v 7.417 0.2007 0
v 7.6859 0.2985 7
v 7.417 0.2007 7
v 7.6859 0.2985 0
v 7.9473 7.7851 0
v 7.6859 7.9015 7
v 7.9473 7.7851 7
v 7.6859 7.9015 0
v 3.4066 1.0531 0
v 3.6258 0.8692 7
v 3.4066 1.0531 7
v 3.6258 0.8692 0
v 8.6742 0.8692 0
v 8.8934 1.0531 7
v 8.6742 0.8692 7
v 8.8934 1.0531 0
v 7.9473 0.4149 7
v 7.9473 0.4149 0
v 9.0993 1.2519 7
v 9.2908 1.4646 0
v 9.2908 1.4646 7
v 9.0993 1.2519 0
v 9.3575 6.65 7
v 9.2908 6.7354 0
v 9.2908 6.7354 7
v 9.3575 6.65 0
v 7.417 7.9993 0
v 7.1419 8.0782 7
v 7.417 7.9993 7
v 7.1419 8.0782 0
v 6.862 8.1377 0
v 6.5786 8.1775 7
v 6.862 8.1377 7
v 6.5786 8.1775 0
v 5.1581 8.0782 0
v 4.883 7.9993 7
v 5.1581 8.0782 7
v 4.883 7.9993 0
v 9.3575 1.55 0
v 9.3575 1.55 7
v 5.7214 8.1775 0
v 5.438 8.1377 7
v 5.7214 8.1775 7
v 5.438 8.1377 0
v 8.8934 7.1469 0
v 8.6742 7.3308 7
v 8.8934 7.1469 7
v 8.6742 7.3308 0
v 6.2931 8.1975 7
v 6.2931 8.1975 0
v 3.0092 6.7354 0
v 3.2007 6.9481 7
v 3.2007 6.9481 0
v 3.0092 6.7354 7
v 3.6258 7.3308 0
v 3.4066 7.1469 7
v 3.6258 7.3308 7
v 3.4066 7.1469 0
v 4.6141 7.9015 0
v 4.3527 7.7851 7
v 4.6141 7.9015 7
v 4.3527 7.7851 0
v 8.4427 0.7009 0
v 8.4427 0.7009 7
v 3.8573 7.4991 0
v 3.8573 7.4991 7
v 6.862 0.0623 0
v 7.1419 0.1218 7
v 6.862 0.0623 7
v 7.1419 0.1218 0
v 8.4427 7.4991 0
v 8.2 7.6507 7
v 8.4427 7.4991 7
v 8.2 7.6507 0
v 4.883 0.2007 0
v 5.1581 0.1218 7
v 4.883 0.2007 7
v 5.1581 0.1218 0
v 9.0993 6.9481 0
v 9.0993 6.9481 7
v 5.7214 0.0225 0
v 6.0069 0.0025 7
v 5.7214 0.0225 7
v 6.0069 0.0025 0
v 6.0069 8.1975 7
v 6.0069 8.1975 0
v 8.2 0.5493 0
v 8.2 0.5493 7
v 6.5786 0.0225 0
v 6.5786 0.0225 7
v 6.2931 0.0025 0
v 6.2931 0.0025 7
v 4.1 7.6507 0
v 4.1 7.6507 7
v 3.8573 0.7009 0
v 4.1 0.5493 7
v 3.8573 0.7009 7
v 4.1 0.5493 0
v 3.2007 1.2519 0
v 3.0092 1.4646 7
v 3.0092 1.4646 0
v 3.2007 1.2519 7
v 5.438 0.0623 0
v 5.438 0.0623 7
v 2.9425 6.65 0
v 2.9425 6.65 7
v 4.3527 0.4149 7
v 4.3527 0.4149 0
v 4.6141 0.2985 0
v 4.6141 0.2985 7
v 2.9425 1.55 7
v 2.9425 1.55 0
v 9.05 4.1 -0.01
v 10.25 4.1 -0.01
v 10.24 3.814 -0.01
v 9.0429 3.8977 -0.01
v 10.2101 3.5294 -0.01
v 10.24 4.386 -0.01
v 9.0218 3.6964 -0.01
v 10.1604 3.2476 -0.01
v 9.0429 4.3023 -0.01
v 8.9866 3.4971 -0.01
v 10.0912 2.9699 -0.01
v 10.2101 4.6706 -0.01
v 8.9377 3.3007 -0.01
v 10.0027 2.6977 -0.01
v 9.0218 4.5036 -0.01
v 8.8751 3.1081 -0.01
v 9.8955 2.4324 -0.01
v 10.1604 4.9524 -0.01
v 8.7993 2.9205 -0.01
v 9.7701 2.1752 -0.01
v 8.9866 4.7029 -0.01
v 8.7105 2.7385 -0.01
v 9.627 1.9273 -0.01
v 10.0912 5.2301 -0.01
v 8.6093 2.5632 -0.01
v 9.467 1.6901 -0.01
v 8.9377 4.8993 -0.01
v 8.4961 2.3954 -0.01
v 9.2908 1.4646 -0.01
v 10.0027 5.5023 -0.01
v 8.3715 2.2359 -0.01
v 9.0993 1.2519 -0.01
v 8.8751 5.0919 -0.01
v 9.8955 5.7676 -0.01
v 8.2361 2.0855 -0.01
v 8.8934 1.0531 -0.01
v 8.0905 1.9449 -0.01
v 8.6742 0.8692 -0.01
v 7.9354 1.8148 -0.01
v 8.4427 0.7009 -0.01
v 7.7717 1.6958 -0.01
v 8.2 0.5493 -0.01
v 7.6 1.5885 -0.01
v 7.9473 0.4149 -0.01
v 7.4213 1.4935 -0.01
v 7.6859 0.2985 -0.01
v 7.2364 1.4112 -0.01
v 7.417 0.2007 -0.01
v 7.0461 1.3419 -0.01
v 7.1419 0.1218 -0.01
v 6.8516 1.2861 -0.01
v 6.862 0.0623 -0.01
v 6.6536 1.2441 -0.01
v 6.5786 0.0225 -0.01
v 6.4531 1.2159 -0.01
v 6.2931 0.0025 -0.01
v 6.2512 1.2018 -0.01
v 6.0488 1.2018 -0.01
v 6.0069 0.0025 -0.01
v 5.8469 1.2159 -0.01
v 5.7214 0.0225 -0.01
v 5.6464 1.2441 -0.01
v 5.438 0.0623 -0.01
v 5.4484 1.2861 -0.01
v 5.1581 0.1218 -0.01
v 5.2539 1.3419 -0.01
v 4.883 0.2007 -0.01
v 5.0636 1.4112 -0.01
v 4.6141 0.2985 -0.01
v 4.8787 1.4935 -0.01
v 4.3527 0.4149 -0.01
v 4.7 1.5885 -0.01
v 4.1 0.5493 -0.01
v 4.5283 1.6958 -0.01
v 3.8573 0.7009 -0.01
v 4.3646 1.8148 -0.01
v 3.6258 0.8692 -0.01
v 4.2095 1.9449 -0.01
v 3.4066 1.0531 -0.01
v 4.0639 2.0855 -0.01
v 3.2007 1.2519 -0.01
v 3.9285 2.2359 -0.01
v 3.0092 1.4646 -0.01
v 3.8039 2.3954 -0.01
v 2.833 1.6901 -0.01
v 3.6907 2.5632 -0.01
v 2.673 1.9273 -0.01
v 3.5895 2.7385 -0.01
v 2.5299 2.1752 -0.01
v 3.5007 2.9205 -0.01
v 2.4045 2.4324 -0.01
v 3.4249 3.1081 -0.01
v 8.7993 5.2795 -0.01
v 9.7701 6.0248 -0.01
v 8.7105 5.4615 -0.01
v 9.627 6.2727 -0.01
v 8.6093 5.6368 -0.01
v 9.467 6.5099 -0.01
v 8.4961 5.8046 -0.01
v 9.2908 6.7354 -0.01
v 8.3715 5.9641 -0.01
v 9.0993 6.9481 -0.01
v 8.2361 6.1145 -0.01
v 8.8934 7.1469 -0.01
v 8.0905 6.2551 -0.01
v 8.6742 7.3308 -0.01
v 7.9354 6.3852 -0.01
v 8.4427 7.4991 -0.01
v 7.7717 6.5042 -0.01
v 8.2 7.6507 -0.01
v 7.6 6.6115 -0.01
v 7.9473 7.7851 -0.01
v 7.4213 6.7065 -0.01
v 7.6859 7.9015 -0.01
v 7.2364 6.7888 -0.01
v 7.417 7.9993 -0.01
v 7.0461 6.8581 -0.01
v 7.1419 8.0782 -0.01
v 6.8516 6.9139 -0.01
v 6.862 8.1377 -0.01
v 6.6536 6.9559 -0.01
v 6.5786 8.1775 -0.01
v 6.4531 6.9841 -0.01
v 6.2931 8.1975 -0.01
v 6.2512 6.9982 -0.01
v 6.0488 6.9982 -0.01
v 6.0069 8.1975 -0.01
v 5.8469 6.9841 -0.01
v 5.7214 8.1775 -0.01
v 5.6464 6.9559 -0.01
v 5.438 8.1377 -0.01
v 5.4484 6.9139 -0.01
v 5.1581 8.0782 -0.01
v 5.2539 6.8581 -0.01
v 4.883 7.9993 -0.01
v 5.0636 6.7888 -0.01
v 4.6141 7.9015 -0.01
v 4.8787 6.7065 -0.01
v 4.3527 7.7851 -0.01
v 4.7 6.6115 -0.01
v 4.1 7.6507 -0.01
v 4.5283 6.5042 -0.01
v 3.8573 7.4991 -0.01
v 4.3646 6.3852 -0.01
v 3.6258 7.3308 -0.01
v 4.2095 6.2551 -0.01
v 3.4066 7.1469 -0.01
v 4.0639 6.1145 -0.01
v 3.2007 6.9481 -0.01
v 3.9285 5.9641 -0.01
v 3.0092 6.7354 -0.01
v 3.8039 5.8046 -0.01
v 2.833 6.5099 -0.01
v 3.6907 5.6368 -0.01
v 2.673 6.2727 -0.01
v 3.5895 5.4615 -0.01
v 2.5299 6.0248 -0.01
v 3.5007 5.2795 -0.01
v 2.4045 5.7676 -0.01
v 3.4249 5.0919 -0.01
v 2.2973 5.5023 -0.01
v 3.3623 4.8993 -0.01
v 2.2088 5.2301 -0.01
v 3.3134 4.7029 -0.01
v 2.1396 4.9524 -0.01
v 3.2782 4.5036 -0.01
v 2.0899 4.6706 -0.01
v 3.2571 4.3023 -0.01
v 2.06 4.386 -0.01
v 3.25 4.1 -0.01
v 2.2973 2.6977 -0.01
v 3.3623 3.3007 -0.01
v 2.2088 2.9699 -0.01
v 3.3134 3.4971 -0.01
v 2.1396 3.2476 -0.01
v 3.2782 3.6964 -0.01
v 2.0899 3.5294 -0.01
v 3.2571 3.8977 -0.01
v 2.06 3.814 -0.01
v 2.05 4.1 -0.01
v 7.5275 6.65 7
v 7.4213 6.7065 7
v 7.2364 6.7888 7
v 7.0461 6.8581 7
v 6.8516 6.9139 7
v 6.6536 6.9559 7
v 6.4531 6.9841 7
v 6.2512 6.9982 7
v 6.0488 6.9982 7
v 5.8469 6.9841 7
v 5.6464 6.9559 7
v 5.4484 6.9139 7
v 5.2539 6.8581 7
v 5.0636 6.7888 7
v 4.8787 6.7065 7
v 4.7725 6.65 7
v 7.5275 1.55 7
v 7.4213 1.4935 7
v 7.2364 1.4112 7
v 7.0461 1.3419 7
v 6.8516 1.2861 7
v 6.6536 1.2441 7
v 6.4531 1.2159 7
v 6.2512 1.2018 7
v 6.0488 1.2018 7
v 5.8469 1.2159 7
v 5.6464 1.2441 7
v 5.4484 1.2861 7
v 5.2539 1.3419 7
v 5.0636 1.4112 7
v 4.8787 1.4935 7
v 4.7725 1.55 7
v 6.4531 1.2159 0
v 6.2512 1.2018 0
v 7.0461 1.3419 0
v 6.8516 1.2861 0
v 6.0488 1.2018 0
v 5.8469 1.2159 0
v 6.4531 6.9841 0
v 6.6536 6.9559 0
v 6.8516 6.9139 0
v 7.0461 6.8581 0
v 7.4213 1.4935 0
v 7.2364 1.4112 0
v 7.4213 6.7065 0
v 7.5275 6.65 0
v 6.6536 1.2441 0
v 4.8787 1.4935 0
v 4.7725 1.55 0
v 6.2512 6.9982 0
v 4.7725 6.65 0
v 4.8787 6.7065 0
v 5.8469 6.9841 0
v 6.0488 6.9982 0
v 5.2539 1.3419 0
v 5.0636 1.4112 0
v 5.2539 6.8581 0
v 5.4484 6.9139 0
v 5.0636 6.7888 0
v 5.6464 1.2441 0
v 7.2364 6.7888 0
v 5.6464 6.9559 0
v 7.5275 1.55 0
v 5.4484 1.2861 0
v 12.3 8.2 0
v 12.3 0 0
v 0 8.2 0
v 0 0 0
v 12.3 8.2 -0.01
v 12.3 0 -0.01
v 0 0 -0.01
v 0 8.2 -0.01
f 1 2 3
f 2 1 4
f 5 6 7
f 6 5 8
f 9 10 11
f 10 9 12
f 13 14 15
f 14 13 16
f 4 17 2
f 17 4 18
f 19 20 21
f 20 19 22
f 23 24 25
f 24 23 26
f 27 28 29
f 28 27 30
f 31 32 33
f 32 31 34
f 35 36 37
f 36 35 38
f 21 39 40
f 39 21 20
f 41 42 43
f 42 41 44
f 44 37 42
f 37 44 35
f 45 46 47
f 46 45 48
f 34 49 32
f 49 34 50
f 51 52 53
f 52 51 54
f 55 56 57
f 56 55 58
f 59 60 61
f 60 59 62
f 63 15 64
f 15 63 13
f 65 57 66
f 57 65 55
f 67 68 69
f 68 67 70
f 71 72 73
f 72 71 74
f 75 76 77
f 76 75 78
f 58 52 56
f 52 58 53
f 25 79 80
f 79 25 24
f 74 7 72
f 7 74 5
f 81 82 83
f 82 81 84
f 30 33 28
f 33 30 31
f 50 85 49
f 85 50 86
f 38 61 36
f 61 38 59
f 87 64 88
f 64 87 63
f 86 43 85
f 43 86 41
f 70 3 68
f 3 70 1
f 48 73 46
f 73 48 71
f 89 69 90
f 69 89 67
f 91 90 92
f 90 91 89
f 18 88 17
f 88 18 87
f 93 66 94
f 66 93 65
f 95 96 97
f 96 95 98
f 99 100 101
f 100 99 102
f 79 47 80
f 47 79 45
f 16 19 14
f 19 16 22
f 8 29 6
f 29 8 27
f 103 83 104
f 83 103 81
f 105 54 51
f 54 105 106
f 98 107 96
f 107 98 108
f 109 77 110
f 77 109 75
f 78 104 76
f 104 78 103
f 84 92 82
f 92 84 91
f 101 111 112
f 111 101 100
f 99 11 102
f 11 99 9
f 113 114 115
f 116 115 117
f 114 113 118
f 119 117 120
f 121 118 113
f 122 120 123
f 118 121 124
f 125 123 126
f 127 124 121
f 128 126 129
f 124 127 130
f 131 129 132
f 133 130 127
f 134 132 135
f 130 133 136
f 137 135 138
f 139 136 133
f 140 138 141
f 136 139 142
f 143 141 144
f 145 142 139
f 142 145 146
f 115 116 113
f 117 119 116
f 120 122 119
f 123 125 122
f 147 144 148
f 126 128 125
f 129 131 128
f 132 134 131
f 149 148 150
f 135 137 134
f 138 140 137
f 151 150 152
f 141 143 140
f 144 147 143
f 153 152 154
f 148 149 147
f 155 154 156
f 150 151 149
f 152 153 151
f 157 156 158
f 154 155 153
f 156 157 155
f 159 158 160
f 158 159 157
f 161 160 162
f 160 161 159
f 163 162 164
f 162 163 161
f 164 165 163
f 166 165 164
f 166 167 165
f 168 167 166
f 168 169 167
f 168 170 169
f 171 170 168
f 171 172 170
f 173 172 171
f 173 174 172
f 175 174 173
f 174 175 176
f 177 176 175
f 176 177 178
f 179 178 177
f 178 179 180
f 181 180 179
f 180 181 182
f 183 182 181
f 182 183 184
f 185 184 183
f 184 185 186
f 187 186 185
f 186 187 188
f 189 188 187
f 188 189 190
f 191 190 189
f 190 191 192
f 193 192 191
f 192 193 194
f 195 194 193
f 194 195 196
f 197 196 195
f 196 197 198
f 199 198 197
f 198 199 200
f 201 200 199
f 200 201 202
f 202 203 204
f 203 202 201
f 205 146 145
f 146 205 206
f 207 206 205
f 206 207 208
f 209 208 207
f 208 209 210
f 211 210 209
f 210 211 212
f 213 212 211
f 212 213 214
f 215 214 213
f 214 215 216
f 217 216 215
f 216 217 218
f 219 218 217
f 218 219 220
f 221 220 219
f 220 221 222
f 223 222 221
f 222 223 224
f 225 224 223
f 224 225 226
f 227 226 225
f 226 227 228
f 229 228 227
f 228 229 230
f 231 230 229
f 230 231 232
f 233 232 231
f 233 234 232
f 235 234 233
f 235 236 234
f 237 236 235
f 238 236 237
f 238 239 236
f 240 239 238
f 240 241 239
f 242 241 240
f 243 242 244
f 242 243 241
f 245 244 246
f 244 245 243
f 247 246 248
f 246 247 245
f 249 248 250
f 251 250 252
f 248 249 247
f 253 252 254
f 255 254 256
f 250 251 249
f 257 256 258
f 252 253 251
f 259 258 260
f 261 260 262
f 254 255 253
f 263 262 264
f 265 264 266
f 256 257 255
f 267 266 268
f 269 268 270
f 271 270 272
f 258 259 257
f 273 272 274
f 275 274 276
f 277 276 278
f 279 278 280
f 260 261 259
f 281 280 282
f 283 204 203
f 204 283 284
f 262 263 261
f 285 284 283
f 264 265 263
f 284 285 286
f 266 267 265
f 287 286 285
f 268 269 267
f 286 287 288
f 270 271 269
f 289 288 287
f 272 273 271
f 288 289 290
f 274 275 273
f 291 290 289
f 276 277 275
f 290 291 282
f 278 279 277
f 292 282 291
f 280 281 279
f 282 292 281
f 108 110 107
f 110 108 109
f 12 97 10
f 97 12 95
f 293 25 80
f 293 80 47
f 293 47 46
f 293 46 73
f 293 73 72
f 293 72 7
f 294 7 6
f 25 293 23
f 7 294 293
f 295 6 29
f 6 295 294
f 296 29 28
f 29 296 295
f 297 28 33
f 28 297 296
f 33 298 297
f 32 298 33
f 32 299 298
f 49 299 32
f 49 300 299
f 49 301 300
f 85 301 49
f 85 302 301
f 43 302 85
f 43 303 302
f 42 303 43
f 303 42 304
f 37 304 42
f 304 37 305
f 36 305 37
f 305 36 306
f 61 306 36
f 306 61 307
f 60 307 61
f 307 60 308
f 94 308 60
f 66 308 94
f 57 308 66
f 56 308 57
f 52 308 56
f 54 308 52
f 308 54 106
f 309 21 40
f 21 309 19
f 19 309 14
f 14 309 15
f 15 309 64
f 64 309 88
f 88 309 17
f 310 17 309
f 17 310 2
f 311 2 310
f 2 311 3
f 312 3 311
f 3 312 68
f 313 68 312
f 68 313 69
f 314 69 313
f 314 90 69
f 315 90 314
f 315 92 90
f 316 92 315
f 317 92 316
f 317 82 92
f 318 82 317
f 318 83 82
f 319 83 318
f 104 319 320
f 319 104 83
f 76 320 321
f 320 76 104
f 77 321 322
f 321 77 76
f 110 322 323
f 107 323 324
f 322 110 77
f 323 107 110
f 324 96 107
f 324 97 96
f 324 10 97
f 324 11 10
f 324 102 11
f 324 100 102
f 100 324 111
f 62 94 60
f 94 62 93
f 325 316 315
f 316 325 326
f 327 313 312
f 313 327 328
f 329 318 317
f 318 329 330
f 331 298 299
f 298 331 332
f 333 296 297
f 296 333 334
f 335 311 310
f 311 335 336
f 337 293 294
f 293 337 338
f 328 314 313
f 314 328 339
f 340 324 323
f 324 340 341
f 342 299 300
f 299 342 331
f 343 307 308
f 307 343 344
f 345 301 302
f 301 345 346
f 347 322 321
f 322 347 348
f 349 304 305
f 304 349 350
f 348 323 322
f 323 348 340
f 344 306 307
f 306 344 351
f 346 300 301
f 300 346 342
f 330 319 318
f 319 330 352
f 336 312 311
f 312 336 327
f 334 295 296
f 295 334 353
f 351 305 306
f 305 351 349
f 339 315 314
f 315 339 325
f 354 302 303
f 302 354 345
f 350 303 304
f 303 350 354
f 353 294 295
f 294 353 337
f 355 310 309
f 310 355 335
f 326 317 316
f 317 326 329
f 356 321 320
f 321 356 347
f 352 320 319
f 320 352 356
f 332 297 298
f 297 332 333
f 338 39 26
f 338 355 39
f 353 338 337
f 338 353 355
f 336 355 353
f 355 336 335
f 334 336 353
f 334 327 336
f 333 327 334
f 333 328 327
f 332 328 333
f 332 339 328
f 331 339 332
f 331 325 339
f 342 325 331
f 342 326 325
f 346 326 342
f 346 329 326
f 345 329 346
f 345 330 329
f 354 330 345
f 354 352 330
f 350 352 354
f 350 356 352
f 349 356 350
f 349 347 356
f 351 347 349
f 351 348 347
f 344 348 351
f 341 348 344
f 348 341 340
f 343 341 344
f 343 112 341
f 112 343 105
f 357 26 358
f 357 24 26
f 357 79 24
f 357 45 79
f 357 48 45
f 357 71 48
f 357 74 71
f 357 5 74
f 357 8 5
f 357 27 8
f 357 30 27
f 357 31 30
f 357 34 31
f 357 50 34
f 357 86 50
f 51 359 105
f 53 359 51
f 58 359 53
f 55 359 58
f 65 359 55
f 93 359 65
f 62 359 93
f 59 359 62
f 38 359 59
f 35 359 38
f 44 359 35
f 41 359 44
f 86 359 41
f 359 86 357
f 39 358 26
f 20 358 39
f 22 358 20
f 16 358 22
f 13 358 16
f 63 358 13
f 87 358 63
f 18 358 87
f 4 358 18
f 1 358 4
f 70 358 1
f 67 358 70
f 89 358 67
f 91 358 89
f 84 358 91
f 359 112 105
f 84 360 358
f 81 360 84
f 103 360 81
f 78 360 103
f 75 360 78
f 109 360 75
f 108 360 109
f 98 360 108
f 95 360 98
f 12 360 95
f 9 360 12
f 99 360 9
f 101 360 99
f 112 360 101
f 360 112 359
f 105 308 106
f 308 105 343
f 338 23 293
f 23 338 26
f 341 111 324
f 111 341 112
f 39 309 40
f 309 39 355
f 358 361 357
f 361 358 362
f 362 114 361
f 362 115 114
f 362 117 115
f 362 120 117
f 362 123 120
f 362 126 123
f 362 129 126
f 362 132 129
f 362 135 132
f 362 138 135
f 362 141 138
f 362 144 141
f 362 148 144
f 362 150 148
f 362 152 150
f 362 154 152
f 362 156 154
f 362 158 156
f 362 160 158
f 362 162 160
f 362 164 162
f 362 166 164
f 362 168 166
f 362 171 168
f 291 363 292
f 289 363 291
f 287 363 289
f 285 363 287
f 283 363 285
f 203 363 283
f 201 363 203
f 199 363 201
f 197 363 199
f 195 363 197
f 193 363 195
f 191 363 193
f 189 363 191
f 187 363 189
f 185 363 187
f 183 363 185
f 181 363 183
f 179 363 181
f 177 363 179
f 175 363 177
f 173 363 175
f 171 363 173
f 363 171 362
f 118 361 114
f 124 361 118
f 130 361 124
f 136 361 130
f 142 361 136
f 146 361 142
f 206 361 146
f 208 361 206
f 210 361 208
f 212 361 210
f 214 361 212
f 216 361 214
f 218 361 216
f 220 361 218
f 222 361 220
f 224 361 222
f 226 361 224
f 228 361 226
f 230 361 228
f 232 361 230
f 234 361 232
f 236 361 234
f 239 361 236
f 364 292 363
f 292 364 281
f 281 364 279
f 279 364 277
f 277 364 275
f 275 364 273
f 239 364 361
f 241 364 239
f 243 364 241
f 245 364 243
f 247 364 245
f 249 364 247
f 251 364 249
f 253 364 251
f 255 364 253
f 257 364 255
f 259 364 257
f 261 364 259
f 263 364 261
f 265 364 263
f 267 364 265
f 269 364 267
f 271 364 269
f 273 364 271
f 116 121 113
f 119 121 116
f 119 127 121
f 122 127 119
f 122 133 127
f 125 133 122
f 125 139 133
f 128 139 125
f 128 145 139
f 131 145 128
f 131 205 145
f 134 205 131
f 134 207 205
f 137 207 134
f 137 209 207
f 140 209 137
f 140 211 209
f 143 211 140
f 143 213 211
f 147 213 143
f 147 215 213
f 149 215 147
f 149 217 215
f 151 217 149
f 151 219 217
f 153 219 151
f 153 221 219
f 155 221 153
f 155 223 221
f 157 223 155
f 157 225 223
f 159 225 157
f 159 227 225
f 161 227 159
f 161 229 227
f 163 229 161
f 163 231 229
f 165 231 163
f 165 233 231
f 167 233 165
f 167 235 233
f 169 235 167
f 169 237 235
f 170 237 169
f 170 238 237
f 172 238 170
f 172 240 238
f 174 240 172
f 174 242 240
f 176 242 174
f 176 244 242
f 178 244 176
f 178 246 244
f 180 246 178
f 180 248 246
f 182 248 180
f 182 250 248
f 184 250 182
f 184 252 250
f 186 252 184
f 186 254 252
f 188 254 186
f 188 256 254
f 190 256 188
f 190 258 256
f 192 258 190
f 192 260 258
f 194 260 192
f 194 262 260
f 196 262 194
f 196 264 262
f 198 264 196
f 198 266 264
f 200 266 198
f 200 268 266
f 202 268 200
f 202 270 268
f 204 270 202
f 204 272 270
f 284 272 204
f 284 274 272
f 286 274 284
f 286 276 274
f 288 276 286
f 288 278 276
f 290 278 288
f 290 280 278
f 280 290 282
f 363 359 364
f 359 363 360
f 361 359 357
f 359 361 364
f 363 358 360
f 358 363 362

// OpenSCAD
// file: ../Base/PlacementOptions.scad
// Fischertechnik Box Foundation
// Placement Options

// Alignment
NoAlign = 0;
AlignLeft = 1;
AlignBottom = 2;
AlignCenter = 3;
AlignRight = 4;
AlignTop = 5;

// Element rotation degree steps
rotations = [0, -90, -180, -270];

// Rotation
NoRotation = 0;
Rotate0 = 0;
Rotate90 = 1;
Rotate180 = 2;
Rotate270 = 3;

// Docking (seen from above)
NoDock = -1;
DockLeft = 0;
DockTop = 1;
DockRight = 2;
DockCorner = 2;
DockBottom = 3;

// Web corners
LowerLeft = 0;
UpperLeft = 1;
UpperRight = 2;
LowerRight = 3;

// Web position relative to corner
LeftOfCorner = 0;
RightOfCorner = 1;
// file: ../Base/Boxes.scad
// Fischertechnik Box Foundation
// Pre-designed Boxes

use <Constants.scad>

include <PlacementOptions.scad>

box190Width = 190;
box190Depth = 130;
box130Width = 130;
box130Depth = 95;
boxUsageHeight = 33.9;
boxWallThickness = 2.4;
boxBaseThickness = 1.0;

// getBoxWallThickness()
// Gets the wall thickness of a Fischertechnik Box

function getBoxWallThickness() = boxWallThickness;

// Gets the usable height of a fischertechnik box
function getBoxUsageHeight() = boxUsageHeight;

// Gets the thickness of the Fischertechnik box base.
function getBoxBaseThickness() = boxBaseThickness;

// Gets the usable inner space of a Box 190 as an x/y-list
function getBox190Space() = [
    box190Width - 2*getBoxWallThickness(), 
    box190Depth - 2*getBoxWallThickness() ];

// Imports the Fischertechnik empty box 130x190 mm and places it at position 0,0
// 190x130 are the outer sizes, the inner space is slightly smaller. Use getBox190Space() to get the inner sizes.
// This module needs the STL file "Fischertechnik Box 130x190.stl" in the library path.
// The box is positioned that the usable inner space is at the 0,0,0 position. The

module Box190() {
    translate([-getBoxWallThickness(),-getBoxWallThickness(),-getBoxBaseThickness()])
        import("Fischertechnik Box 130x190.stl", convexity=3);
}

// Gets the usable inner space of a Box 130 as an x/y-list
function getBox130Space() = [
    box130Width - 2*getBoxWallThickness(), 
    box130Depth - 2*getBoxWallThickness() ];

// Imports the Fischertechnik empty box 95x130 mm and places it at position 0,0
// 190x130 are the outer sizes, the inner space is slightly smaller. Use getBox190Space() to get the inner sizes.
// This module needs the STL file "Fischertechnik Box 95x130.stl" in the library path.
// The box is positioned that the usable inner space is at the 0,0,0 position. The

module Box130() {
    translate([-getBoxWallThickness(),-getBoxWallThickness(),-getBoxBaseThickness()])
        import("Fischertechnik Box 95x130.stl", convexity=3);
}

// Creates a web at the specified box walls
// corner 0 = LowerLeft, 1 = UpperLeft, 2 = UpperRight, 3 = LowerRight
// side 0 = LeftOfCorner, 1 = RightOfCorner
// distance = Distance in mm from the corner
// box = inner width and depth of the box (default: Box 190)
// webWidth = length of the web (default is 3 mms)
// webThickness = thickness of the web (default is 1 mm)

module BoxWeb(corner, side, distance, box=getBox190Space(), webWidth=3, webThickness=1.0) {
    sink = getBoxWallThickness()/2;

    width = (corner % 2 == 0) ? 
            (side == LeftOfCorner ? webWidth : webThickness) :
            (side == LeftOfCorner ? webThickness : webWidth);

    depth = (corner % 2 == 0) ? 
            (side == RightOfCorner ? webWidth : webThickness) :
            (side == RightOfCorner ? webThickness : webWidth);
    
    xDiff = corner == LowerLeft ? 
                (side == LeftOfCorner ? -sink : distance) :
            (corner == UpperLeft ?                
                (side == LeftOfCorner ? distance : -sink) :
            (corner == UpperRight ?
                (side == LeftOfCorner ? box.x-webWidth+sink : box.x-distance-webThickness) :
                (side == LeftOfCorner ? box.x-distance-webThickness: box.x-webWidth+sink)));

    yDiff = corner == LowerLeft ? 
                (side == RightOfCorner ? -sink : distance) :
            (corner == UpperLeft ?
                (side == RightOfCorner ? box.y-distance : box.y-webWidth+sink) :
            (corner == UpperRight ?
                (side == RightOfCorner ? box.y-webWidth+sink : box.y-distance) :
                (side == RightOfCorner ? distance : -sink)));
    
    translate([xDiff, yDiff, -getExcess()])
        cube([width, depth, boxUsageHeight + 2*getExcess()]);
}
// file: ../Base/Rotation.scad
// Fischertechnik Box Foundation
// Geometry Helpers Rotation

include <PlacementOptions.scad>

// getRotatedSpace(space, rotation=NoRotation)
// Rotates the space dependent on the specified rotation

function getRotatedSpace(space, rotation=NoRotation) = [
    (rotation == Rotate90 || rotation == Rotate270) ? space.y : space.x,
    (rotation == Rotate90 || rotation == Rotate270) ? space.x : space.y
];

// Rotates the given space around the fixed left lower corner
// space = the space the children needs as width/depth list [width,depth]
// rotation = 0 Rotate0 degrees, 1 Rotate90 degrees, 2 Rotate180 degrees, 3 Rotate270 degrees (equivalent to -90)

module RotateFix(space, rotation=Rotate0) {
    dy = (rotation == Rotate0 || rotation == Rotate270) ? 0 :
        (rotation == Rotate90) ? space.x :
        space.y;
    dx = (rotation < Rotate180) ? 0 :
        (rotation == Rotate180) ? space.x :
        space.y;
    
    translate([dx, dy, 0])
        rotate([0, 0, rotations[rotation]])
            children();
}
// file: ../Base/Alignment.scad
// Fischertechnik Box Foundation
// Geometry Helpers Alignment

include <PlacementOptions.scad>

// getAlignedX(elementWidth, spaceWidth, align=AlignRight, offset=0)
// Gets the aligned X offset of an element with the given
// width in the given space.
// elementWidth = The width of the element to positon
// spaceWidth = The space where the element should be aligned
// align = 0 AlignLeft, 1 AlignCenter, 2 AlignRight
// offset = an optional offset from the aligned position. When
// aligned left or centered, then positive values are in X direction.
// When aligned right then positive values are in negative X direction.

function getAlignedX(elementWidth, spaceWidth, align=AlignRight, offset=0) =
    (align == AlignLeft) ?
        offset :
        ((align == AlignCenter) ?
        (spaceWidth - elementWidth)/2 + offset :
        spaceWidth - offset - elementWidth);

// getAlignedY(elementDepth, spaceDepth, align=AlignTop, offset=0)
// Gets the aligned Y offset of an element with the given
// depth in the given space.
// elementDepth = The depth of the element to positon
// spaceDepth = The space where the element should be aligned
// align = 0 AlignBottom, 1 AlignCenter, 2 AlignTop
// offset = an optional offset from the aligned position. When
// aligned bottom or centered, then positive values are in Y direction.
// When aligned top then positive values are in negative Y direction.

function getAlignedY(elementDepth, spaceDepth, align=AlignTop, offset=0) =
    (align == AlignBottom) ?
        offset :
        ((align == AlignCenter) ?
        (spaceDepth - elementDepth)/2 + offset :
        spaceDepth - offset - elementDepth);
// file: ../Base/Placement.scad
// Fischertechnik Box Foundation
// Geometry Helpers Placement

use <Constants.scad>
use <Alignment.scad>
use <Rotation.scad>
use <Boxes.scad>

include <PlacementOptions.scad>

// Place(x=0, y=0, elementSpace=[0,0], alignX=AlignLeft, alignY=AlignBottom, rotation=Rotate0, boxSpace=getBox190Space())
// Places the child at the specified position
// y = Y-Position. This is a relative position when an X aligment is specified.
// x = X-Position. This is a relative position when an Y aligment is specified.
// elementSpace = space of the element to be placed [x,y]
// alignX = -1=NoAlign, 0 AlignLeft, 1 AlignCenter, 3 AlignRight (elementSpace and boxSpace required!)
// alignY = -1=NoAlign, 2 AlignBottom, 1 AlignCenter, 4 AlignTop (elementSpace and boxSpace required!)
// rotation = 0 Rotate0 0 degrees, 1 Rotate90 90 degrees, 
// 2 Rotate180 180 degrees, 3 Rotate270 270 degrees (equivalent to -90)
// boxSpace = Inner space of the box where the placement occurs [x,y] - default is Box 190x130 inner space

module Place(x=0, y=0, elementSpace=[0,0], 
  alignX=AlignLeft, alignY=AlignBottom, 
  rotation=NoRotation, boxSpace=getBox190Space()) {

    module Position(x, y, space, rotation=Rotate0) {
        translate([x, y, 0])
            RotateFix(space, rotation)
                children(0);
    }

    space = getRotatedSpace(elementSpace, rotation);
    alignedX = getAlignedX(space.x, boxSpace.x, alignX, x);
    alignedY = getAlignedY(space.y, boxSpace.y, alignY, y);
    Position(alignedX, alignedY, elementSpace, rotation)
        children(0);
}

// Center(space=getBox130Space(), elementSpace=[0,0])
// space = Space where the children is centered. For cylinder use centered=true and no elementSpace.
// elementSpace = space of the element to be centered [x,y]

module Center(space=getBox190Space(), elementSpace=[0,0]) {
    translate([(space.x - elementSpace.x) / 2, (space.y - elementSpace.y) / 2])
        children(0);
}

// CenterHorizontal(width=0, y=0, offset=0, space=getBox130Space())
// space = Space where the children is centered. For cylinder use centered=true and no elementSpace.
// elementSpace = space of the element to be centered [x,y]

module CenterHorizontal(width=0, y=0, offset=0, space=getBox190Space()) {
    translate([(space.x - width) / 2 + offset, y])
        children(0);
}

// CenterVertical(depth=0, x=0, offset=0, space=getBox130Space())
// space = Space where the children is centered. For cylinder use centered=true and no elementSpace.
// elementSpace = space of the element to be centered [x,y]

module CenterVerticalal(depth=0, x=0, offset=0, space=getBox190Space()) {
    translate([x, (space.y - depth) / 2 + offset])
        children(0);
}
// file: ../Base/Constants.scad
// Fischertechnik Box Foundation
// Constants

// Constant values necessary for multiple elements

// Base constants
dividerThickness = 1.2;
excess = 0.01;
fragments = 90;
tolerance = 0.8;

// Gets the thickness of a divider 
function getDividerThickness() = dividerThickness;

// Gets the excess that is used to merge walls into each other
function getExcess() = excess;

// Gets amount of fragments of a cylinder
function getFragments() = fragments;

// Gets the inner tolerance of a frame to each side
function getTolerance() = tolerance;


// Fischertechnik specific constants
axisDiameter = 4;
axisBottomDiameter = axisDiameter + 1;
standardEdgeDistance = 2.5;
standardWebDistance = 11.5;
standardCornerLength = 15;
tubeWallFactor = 1.6;

// Gets axis diameter
function getAxisDiameter() = axisDiameter;

// Gets axis bottom diameter for thicker part at the bottom
function getAxisBottomDiameter() = axisBottomDiameter;

// gets the standard distance to the wall of the box for dockable frames with webs
function getStandardEdgeDistance() = standardEdgeDistance;

// gets the standard distance of each web to the corner of the dockable frame
function getStandardWebDistance() = standardWebDistance;

// gets the standard length of the corner walls of a dockable frame
function getStandardCornerLength() = standardCornerLength;

// gets the wall thickness of a tube.
function getTubeWallThickness() = tubeWallFactor * getDividerThickness();
// main file
// Fischertechnik Box Library
// Holder for bulb lamp and lens tip lamp
// 37869, 37875

use <../Base/Constants.scad>
use <../Base/Placement.scad>
use <../ModelBase/Simple.scad>

width = 11.5;
depth = 5.8;

// getHolderBulbLampSpace()
// Gets the space the bulb lamp holder needs as width and depth (.x and .y as a list)

function getHolderBulbLampSpace() = [width + getTolerance(), depth + 2*getDividerThickness()];

// HolderBulbLamp()
// Holder for a bulb lamp.

module HolderBulbLamp() {
    height = 7.0;
    cutoffDepth = 5.1;
    $fn = getFragments();
    diameter = depth + 2*getDividerThickness();

    module BulbCylinder() {
        Center(getHolderBulbLampSpace())
        {        
            difference() {
                cylinder(h = height + getExcess(), d = depth + 2*getDividerThickness());
                cylinder(h = height + 2*getExcess(), d = depth);
            }
        }
    }

    Space(getHolderBulbLampSpace());
    
    difference() {
        translate([0, 0, -getExcess()])
            BulbCylinder();
        translate([0, (getHolderBulbLampSpace().y-cutoffDepth)/2])
            cube([getHolderBulbLampSpace().x, cutoffDepth, height + 1]);
    }
}


// Tests
color("lightgray") {
HolderBulbLamp();
}
